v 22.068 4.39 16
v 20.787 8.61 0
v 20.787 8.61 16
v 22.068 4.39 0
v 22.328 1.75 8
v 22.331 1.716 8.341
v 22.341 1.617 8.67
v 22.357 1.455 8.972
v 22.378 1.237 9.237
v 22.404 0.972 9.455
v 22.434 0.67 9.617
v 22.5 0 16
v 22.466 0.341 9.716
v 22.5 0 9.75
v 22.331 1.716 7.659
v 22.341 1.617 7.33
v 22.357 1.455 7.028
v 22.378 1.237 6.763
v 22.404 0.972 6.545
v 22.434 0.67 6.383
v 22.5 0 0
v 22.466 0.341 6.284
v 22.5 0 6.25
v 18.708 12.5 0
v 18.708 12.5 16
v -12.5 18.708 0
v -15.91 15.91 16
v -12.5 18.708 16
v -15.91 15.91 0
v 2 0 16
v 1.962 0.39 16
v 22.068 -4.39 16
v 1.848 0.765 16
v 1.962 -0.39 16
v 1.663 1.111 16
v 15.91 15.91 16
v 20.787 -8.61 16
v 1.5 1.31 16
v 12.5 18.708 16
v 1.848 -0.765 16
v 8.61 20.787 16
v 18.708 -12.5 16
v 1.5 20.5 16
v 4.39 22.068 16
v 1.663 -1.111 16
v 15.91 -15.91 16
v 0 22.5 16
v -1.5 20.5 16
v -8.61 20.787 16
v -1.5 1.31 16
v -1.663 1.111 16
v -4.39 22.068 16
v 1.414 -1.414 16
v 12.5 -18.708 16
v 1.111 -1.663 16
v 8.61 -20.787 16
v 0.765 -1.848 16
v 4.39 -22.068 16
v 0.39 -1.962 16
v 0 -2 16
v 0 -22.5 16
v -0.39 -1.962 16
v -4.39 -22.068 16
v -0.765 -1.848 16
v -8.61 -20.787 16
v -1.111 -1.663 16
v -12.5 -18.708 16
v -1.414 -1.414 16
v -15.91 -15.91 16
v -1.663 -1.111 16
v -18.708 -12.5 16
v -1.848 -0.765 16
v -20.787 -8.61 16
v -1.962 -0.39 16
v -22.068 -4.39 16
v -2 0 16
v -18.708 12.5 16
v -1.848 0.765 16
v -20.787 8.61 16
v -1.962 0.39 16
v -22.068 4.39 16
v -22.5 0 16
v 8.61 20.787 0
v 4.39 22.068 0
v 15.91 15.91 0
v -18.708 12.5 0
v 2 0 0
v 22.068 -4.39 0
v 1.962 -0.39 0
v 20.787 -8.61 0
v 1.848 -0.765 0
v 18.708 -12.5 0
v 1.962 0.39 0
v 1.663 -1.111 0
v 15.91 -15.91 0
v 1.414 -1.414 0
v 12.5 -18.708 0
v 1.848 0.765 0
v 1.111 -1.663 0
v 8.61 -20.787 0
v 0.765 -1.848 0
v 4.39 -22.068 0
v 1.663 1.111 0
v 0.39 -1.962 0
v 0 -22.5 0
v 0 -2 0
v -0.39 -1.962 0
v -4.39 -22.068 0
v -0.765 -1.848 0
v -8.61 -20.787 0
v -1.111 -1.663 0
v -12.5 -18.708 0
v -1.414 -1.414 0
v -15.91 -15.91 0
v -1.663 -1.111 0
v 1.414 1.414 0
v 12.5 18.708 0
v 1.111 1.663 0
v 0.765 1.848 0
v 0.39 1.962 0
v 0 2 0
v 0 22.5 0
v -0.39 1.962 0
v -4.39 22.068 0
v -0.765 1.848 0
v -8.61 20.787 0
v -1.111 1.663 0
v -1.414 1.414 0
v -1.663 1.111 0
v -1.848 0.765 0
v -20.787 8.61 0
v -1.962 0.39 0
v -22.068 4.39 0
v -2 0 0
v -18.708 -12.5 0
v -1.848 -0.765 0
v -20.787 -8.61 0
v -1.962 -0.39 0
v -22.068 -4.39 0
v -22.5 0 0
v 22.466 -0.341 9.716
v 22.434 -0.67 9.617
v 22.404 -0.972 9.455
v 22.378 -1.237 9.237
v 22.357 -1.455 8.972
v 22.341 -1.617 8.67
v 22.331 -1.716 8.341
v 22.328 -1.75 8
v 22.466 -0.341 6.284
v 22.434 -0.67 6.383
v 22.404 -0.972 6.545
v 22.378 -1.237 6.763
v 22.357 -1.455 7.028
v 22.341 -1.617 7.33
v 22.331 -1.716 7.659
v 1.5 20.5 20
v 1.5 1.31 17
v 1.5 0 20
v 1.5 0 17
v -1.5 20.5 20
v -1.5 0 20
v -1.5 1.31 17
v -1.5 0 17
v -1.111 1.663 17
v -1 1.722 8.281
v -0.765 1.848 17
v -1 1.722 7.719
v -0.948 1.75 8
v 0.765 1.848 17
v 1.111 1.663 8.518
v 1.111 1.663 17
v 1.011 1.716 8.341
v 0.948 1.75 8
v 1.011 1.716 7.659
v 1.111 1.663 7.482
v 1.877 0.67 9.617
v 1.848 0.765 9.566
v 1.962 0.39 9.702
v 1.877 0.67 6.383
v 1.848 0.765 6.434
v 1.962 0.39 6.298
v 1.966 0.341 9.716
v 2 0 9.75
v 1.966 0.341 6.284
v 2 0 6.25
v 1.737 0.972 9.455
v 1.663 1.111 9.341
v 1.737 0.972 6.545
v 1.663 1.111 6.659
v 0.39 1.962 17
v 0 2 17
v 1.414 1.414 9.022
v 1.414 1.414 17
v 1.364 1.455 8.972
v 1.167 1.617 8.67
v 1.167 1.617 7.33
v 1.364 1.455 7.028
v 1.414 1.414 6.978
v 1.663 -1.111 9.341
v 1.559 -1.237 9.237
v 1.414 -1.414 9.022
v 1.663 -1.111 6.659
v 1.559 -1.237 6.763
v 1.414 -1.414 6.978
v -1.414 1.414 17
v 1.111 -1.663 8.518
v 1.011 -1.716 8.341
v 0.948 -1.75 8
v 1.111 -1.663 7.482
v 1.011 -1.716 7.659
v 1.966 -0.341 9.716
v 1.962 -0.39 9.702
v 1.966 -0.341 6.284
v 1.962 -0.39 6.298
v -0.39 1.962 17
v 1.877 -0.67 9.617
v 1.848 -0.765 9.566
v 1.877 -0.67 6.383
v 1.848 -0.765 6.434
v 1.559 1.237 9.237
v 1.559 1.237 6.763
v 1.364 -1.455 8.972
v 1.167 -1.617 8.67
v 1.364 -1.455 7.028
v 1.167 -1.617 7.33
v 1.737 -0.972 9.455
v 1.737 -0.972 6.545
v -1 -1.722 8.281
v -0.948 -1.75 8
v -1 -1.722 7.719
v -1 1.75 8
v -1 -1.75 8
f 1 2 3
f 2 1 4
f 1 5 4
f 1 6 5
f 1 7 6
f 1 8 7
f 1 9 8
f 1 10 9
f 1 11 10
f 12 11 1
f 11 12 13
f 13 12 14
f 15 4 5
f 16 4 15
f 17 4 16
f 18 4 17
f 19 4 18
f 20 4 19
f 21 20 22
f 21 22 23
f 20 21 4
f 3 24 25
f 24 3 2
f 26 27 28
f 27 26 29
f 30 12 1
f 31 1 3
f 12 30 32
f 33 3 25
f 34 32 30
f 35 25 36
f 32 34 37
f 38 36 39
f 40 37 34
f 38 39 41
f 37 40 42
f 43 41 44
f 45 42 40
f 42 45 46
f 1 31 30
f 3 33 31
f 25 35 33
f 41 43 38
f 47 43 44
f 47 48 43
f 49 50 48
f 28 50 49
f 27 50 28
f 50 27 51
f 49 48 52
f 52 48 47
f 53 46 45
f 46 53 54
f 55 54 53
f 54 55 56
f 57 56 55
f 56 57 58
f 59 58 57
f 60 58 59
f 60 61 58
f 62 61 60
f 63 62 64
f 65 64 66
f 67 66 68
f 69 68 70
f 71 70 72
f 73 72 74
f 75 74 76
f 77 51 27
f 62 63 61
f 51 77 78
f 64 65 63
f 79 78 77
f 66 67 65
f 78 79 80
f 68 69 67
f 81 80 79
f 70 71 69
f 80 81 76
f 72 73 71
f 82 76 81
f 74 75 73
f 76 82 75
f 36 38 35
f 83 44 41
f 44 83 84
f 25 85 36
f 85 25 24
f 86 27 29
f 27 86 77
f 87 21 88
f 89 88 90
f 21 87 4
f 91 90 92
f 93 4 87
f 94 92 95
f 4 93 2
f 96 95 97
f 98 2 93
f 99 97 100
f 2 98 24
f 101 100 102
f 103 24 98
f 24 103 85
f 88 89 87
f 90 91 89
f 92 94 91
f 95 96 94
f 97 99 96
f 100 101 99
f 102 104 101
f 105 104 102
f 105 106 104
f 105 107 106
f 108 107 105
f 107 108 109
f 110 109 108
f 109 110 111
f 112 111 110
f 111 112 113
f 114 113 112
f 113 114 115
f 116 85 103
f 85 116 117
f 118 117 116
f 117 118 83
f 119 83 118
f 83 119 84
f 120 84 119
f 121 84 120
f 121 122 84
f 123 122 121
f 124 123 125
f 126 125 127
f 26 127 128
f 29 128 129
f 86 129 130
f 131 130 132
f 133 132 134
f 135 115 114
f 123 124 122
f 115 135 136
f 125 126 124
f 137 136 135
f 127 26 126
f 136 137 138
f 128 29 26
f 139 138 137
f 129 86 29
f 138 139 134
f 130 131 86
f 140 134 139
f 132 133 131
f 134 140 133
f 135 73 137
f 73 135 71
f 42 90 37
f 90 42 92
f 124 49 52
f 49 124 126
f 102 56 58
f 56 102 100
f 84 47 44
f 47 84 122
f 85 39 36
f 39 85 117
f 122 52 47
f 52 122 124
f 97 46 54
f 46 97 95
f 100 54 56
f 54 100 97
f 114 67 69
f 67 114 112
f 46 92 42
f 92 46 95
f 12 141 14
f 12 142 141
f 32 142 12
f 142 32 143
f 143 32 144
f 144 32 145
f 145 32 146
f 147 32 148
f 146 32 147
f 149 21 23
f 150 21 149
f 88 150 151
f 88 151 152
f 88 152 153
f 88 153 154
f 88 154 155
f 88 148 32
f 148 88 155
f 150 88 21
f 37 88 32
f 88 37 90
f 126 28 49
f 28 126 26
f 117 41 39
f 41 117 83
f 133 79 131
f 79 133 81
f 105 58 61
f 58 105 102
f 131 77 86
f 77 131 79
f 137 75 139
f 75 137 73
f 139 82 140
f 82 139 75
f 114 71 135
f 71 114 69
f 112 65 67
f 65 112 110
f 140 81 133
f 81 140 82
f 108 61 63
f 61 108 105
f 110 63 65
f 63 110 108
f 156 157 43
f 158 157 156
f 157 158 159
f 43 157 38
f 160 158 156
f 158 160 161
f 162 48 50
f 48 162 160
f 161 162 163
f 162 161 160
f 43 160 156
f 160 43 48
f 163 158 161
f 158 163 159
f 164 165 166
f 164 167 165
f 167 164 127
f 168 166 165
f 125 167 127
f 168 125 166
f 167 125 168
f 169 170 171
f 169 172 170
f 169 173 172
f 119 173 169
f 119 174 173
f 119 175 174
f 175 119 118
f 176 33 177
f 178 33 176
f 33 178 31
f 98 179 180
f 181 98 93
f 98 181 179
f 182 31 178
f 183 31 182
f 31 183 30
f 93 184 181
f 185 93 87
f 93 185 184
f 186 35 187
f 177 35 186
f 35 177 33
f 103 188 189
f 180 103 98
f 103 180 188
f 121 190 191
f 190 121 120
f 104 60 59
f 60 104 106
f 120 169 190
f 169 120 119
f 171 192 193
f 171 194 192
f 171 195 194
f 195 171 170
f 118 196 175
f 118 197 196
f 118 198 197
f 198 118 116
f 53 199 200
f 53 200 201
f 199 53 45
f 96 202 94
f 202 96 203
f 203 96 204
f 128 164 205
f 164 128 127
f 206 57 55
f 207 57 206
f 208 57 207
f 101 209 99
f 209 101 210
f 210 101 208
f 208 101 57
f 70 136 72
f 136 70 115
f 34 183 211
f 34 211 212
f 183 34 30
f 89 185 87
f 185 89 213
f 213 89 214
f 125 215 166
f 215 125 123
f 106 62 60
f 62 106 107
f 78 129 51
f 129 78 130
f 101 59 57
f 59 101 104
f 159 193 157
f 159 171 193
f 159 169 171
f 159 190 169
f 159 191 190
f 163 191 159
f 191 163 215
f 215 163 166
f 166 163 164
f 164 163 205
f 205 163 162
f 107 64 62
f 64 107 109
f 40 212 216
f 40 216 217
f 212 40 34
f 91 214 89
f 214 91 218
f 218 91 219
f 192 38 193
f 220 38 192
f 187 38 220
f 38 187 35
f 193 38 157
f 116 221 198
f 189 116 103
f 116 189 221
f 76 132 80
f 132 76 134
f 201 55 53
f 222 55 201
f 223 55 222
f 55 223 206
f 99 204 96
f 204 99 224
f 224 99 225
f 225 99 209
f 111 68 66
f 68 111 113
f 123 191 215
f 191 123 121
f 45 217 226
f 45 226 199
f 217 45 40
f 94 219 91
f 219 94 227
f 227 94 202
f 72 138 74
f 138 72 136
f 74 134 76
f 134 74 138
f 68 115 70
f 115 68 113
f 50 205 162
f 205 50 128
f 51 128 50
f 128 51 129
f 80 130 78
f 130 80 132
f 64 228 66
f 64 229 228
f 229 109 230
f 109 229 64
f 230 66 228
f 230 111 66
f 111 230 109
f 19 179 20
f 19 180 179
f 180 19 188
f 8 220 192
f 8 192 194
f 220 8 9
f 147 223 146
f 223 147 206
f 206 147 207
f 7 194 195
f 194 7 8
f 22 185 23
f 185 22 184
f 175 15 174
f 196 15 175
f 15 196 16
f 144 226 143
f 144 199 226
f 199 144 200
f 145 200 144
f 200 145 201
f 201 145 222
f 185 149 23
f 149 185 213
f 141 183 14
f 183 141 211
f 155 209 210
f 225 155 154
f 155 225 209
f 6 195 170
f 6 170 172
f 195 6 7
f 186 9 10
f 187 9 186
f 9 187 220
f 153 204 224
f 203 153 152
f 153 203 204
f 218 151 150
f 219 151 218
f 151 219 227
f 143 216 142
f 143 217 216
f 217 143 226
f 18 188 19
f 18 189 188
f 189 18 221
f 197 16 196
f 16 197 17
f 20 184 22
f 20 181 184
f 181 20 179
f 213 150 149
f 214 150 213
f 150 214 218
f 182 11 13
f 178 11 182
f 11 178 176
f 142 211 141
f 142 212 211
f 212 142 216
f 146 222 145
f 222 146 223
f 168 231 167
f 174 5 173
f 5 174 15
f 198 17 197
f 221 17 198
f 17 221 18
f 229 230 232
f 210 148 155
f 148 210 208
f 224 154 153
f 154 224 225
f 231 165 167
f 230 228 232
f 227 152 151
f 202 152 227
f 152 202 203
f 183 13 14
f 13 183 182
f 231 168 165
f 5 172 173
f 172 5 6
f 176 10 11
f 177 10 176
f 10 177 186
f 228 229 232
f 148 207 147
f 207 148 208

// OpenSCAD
$fn = 32;

// ----------------------------------------------------------------------
// Control knob: pointer knob
// ----------------------------------------------------------------------

// --- parameters (mm) ---
rib_w = 3;                // pointer rib width
rib_h = 5;                // pointer rib height
knob_d = 45;              // knob body diameter
knob_h = 16;              // knob body height
bore_d = 4;               // shaft bore diameter
set_d = 3.5;              // set screw bore diameter

rib_poke = rib_h - 1;  // rib height above the top
total_h = knob_h + rib_h - 1;  // overall height

difference() {
  union() {
    cylinder(h = knob_h, d = knob_d);
    translate([-rib_w / 2, 0, knob_h - 1])
      cube([rib_w, knob_d / 2 - 2, rib_h]);
  }
  translate([0, 0, -1]) cylinder(h = knob_h + 2, d = bore_d);
  translate([-1, 0, knob_h / 2]) rotate([0, 90, 0])
    cylinder(h = knob_d / 2 + bore_d / 2 + 2, d = set_d);}
